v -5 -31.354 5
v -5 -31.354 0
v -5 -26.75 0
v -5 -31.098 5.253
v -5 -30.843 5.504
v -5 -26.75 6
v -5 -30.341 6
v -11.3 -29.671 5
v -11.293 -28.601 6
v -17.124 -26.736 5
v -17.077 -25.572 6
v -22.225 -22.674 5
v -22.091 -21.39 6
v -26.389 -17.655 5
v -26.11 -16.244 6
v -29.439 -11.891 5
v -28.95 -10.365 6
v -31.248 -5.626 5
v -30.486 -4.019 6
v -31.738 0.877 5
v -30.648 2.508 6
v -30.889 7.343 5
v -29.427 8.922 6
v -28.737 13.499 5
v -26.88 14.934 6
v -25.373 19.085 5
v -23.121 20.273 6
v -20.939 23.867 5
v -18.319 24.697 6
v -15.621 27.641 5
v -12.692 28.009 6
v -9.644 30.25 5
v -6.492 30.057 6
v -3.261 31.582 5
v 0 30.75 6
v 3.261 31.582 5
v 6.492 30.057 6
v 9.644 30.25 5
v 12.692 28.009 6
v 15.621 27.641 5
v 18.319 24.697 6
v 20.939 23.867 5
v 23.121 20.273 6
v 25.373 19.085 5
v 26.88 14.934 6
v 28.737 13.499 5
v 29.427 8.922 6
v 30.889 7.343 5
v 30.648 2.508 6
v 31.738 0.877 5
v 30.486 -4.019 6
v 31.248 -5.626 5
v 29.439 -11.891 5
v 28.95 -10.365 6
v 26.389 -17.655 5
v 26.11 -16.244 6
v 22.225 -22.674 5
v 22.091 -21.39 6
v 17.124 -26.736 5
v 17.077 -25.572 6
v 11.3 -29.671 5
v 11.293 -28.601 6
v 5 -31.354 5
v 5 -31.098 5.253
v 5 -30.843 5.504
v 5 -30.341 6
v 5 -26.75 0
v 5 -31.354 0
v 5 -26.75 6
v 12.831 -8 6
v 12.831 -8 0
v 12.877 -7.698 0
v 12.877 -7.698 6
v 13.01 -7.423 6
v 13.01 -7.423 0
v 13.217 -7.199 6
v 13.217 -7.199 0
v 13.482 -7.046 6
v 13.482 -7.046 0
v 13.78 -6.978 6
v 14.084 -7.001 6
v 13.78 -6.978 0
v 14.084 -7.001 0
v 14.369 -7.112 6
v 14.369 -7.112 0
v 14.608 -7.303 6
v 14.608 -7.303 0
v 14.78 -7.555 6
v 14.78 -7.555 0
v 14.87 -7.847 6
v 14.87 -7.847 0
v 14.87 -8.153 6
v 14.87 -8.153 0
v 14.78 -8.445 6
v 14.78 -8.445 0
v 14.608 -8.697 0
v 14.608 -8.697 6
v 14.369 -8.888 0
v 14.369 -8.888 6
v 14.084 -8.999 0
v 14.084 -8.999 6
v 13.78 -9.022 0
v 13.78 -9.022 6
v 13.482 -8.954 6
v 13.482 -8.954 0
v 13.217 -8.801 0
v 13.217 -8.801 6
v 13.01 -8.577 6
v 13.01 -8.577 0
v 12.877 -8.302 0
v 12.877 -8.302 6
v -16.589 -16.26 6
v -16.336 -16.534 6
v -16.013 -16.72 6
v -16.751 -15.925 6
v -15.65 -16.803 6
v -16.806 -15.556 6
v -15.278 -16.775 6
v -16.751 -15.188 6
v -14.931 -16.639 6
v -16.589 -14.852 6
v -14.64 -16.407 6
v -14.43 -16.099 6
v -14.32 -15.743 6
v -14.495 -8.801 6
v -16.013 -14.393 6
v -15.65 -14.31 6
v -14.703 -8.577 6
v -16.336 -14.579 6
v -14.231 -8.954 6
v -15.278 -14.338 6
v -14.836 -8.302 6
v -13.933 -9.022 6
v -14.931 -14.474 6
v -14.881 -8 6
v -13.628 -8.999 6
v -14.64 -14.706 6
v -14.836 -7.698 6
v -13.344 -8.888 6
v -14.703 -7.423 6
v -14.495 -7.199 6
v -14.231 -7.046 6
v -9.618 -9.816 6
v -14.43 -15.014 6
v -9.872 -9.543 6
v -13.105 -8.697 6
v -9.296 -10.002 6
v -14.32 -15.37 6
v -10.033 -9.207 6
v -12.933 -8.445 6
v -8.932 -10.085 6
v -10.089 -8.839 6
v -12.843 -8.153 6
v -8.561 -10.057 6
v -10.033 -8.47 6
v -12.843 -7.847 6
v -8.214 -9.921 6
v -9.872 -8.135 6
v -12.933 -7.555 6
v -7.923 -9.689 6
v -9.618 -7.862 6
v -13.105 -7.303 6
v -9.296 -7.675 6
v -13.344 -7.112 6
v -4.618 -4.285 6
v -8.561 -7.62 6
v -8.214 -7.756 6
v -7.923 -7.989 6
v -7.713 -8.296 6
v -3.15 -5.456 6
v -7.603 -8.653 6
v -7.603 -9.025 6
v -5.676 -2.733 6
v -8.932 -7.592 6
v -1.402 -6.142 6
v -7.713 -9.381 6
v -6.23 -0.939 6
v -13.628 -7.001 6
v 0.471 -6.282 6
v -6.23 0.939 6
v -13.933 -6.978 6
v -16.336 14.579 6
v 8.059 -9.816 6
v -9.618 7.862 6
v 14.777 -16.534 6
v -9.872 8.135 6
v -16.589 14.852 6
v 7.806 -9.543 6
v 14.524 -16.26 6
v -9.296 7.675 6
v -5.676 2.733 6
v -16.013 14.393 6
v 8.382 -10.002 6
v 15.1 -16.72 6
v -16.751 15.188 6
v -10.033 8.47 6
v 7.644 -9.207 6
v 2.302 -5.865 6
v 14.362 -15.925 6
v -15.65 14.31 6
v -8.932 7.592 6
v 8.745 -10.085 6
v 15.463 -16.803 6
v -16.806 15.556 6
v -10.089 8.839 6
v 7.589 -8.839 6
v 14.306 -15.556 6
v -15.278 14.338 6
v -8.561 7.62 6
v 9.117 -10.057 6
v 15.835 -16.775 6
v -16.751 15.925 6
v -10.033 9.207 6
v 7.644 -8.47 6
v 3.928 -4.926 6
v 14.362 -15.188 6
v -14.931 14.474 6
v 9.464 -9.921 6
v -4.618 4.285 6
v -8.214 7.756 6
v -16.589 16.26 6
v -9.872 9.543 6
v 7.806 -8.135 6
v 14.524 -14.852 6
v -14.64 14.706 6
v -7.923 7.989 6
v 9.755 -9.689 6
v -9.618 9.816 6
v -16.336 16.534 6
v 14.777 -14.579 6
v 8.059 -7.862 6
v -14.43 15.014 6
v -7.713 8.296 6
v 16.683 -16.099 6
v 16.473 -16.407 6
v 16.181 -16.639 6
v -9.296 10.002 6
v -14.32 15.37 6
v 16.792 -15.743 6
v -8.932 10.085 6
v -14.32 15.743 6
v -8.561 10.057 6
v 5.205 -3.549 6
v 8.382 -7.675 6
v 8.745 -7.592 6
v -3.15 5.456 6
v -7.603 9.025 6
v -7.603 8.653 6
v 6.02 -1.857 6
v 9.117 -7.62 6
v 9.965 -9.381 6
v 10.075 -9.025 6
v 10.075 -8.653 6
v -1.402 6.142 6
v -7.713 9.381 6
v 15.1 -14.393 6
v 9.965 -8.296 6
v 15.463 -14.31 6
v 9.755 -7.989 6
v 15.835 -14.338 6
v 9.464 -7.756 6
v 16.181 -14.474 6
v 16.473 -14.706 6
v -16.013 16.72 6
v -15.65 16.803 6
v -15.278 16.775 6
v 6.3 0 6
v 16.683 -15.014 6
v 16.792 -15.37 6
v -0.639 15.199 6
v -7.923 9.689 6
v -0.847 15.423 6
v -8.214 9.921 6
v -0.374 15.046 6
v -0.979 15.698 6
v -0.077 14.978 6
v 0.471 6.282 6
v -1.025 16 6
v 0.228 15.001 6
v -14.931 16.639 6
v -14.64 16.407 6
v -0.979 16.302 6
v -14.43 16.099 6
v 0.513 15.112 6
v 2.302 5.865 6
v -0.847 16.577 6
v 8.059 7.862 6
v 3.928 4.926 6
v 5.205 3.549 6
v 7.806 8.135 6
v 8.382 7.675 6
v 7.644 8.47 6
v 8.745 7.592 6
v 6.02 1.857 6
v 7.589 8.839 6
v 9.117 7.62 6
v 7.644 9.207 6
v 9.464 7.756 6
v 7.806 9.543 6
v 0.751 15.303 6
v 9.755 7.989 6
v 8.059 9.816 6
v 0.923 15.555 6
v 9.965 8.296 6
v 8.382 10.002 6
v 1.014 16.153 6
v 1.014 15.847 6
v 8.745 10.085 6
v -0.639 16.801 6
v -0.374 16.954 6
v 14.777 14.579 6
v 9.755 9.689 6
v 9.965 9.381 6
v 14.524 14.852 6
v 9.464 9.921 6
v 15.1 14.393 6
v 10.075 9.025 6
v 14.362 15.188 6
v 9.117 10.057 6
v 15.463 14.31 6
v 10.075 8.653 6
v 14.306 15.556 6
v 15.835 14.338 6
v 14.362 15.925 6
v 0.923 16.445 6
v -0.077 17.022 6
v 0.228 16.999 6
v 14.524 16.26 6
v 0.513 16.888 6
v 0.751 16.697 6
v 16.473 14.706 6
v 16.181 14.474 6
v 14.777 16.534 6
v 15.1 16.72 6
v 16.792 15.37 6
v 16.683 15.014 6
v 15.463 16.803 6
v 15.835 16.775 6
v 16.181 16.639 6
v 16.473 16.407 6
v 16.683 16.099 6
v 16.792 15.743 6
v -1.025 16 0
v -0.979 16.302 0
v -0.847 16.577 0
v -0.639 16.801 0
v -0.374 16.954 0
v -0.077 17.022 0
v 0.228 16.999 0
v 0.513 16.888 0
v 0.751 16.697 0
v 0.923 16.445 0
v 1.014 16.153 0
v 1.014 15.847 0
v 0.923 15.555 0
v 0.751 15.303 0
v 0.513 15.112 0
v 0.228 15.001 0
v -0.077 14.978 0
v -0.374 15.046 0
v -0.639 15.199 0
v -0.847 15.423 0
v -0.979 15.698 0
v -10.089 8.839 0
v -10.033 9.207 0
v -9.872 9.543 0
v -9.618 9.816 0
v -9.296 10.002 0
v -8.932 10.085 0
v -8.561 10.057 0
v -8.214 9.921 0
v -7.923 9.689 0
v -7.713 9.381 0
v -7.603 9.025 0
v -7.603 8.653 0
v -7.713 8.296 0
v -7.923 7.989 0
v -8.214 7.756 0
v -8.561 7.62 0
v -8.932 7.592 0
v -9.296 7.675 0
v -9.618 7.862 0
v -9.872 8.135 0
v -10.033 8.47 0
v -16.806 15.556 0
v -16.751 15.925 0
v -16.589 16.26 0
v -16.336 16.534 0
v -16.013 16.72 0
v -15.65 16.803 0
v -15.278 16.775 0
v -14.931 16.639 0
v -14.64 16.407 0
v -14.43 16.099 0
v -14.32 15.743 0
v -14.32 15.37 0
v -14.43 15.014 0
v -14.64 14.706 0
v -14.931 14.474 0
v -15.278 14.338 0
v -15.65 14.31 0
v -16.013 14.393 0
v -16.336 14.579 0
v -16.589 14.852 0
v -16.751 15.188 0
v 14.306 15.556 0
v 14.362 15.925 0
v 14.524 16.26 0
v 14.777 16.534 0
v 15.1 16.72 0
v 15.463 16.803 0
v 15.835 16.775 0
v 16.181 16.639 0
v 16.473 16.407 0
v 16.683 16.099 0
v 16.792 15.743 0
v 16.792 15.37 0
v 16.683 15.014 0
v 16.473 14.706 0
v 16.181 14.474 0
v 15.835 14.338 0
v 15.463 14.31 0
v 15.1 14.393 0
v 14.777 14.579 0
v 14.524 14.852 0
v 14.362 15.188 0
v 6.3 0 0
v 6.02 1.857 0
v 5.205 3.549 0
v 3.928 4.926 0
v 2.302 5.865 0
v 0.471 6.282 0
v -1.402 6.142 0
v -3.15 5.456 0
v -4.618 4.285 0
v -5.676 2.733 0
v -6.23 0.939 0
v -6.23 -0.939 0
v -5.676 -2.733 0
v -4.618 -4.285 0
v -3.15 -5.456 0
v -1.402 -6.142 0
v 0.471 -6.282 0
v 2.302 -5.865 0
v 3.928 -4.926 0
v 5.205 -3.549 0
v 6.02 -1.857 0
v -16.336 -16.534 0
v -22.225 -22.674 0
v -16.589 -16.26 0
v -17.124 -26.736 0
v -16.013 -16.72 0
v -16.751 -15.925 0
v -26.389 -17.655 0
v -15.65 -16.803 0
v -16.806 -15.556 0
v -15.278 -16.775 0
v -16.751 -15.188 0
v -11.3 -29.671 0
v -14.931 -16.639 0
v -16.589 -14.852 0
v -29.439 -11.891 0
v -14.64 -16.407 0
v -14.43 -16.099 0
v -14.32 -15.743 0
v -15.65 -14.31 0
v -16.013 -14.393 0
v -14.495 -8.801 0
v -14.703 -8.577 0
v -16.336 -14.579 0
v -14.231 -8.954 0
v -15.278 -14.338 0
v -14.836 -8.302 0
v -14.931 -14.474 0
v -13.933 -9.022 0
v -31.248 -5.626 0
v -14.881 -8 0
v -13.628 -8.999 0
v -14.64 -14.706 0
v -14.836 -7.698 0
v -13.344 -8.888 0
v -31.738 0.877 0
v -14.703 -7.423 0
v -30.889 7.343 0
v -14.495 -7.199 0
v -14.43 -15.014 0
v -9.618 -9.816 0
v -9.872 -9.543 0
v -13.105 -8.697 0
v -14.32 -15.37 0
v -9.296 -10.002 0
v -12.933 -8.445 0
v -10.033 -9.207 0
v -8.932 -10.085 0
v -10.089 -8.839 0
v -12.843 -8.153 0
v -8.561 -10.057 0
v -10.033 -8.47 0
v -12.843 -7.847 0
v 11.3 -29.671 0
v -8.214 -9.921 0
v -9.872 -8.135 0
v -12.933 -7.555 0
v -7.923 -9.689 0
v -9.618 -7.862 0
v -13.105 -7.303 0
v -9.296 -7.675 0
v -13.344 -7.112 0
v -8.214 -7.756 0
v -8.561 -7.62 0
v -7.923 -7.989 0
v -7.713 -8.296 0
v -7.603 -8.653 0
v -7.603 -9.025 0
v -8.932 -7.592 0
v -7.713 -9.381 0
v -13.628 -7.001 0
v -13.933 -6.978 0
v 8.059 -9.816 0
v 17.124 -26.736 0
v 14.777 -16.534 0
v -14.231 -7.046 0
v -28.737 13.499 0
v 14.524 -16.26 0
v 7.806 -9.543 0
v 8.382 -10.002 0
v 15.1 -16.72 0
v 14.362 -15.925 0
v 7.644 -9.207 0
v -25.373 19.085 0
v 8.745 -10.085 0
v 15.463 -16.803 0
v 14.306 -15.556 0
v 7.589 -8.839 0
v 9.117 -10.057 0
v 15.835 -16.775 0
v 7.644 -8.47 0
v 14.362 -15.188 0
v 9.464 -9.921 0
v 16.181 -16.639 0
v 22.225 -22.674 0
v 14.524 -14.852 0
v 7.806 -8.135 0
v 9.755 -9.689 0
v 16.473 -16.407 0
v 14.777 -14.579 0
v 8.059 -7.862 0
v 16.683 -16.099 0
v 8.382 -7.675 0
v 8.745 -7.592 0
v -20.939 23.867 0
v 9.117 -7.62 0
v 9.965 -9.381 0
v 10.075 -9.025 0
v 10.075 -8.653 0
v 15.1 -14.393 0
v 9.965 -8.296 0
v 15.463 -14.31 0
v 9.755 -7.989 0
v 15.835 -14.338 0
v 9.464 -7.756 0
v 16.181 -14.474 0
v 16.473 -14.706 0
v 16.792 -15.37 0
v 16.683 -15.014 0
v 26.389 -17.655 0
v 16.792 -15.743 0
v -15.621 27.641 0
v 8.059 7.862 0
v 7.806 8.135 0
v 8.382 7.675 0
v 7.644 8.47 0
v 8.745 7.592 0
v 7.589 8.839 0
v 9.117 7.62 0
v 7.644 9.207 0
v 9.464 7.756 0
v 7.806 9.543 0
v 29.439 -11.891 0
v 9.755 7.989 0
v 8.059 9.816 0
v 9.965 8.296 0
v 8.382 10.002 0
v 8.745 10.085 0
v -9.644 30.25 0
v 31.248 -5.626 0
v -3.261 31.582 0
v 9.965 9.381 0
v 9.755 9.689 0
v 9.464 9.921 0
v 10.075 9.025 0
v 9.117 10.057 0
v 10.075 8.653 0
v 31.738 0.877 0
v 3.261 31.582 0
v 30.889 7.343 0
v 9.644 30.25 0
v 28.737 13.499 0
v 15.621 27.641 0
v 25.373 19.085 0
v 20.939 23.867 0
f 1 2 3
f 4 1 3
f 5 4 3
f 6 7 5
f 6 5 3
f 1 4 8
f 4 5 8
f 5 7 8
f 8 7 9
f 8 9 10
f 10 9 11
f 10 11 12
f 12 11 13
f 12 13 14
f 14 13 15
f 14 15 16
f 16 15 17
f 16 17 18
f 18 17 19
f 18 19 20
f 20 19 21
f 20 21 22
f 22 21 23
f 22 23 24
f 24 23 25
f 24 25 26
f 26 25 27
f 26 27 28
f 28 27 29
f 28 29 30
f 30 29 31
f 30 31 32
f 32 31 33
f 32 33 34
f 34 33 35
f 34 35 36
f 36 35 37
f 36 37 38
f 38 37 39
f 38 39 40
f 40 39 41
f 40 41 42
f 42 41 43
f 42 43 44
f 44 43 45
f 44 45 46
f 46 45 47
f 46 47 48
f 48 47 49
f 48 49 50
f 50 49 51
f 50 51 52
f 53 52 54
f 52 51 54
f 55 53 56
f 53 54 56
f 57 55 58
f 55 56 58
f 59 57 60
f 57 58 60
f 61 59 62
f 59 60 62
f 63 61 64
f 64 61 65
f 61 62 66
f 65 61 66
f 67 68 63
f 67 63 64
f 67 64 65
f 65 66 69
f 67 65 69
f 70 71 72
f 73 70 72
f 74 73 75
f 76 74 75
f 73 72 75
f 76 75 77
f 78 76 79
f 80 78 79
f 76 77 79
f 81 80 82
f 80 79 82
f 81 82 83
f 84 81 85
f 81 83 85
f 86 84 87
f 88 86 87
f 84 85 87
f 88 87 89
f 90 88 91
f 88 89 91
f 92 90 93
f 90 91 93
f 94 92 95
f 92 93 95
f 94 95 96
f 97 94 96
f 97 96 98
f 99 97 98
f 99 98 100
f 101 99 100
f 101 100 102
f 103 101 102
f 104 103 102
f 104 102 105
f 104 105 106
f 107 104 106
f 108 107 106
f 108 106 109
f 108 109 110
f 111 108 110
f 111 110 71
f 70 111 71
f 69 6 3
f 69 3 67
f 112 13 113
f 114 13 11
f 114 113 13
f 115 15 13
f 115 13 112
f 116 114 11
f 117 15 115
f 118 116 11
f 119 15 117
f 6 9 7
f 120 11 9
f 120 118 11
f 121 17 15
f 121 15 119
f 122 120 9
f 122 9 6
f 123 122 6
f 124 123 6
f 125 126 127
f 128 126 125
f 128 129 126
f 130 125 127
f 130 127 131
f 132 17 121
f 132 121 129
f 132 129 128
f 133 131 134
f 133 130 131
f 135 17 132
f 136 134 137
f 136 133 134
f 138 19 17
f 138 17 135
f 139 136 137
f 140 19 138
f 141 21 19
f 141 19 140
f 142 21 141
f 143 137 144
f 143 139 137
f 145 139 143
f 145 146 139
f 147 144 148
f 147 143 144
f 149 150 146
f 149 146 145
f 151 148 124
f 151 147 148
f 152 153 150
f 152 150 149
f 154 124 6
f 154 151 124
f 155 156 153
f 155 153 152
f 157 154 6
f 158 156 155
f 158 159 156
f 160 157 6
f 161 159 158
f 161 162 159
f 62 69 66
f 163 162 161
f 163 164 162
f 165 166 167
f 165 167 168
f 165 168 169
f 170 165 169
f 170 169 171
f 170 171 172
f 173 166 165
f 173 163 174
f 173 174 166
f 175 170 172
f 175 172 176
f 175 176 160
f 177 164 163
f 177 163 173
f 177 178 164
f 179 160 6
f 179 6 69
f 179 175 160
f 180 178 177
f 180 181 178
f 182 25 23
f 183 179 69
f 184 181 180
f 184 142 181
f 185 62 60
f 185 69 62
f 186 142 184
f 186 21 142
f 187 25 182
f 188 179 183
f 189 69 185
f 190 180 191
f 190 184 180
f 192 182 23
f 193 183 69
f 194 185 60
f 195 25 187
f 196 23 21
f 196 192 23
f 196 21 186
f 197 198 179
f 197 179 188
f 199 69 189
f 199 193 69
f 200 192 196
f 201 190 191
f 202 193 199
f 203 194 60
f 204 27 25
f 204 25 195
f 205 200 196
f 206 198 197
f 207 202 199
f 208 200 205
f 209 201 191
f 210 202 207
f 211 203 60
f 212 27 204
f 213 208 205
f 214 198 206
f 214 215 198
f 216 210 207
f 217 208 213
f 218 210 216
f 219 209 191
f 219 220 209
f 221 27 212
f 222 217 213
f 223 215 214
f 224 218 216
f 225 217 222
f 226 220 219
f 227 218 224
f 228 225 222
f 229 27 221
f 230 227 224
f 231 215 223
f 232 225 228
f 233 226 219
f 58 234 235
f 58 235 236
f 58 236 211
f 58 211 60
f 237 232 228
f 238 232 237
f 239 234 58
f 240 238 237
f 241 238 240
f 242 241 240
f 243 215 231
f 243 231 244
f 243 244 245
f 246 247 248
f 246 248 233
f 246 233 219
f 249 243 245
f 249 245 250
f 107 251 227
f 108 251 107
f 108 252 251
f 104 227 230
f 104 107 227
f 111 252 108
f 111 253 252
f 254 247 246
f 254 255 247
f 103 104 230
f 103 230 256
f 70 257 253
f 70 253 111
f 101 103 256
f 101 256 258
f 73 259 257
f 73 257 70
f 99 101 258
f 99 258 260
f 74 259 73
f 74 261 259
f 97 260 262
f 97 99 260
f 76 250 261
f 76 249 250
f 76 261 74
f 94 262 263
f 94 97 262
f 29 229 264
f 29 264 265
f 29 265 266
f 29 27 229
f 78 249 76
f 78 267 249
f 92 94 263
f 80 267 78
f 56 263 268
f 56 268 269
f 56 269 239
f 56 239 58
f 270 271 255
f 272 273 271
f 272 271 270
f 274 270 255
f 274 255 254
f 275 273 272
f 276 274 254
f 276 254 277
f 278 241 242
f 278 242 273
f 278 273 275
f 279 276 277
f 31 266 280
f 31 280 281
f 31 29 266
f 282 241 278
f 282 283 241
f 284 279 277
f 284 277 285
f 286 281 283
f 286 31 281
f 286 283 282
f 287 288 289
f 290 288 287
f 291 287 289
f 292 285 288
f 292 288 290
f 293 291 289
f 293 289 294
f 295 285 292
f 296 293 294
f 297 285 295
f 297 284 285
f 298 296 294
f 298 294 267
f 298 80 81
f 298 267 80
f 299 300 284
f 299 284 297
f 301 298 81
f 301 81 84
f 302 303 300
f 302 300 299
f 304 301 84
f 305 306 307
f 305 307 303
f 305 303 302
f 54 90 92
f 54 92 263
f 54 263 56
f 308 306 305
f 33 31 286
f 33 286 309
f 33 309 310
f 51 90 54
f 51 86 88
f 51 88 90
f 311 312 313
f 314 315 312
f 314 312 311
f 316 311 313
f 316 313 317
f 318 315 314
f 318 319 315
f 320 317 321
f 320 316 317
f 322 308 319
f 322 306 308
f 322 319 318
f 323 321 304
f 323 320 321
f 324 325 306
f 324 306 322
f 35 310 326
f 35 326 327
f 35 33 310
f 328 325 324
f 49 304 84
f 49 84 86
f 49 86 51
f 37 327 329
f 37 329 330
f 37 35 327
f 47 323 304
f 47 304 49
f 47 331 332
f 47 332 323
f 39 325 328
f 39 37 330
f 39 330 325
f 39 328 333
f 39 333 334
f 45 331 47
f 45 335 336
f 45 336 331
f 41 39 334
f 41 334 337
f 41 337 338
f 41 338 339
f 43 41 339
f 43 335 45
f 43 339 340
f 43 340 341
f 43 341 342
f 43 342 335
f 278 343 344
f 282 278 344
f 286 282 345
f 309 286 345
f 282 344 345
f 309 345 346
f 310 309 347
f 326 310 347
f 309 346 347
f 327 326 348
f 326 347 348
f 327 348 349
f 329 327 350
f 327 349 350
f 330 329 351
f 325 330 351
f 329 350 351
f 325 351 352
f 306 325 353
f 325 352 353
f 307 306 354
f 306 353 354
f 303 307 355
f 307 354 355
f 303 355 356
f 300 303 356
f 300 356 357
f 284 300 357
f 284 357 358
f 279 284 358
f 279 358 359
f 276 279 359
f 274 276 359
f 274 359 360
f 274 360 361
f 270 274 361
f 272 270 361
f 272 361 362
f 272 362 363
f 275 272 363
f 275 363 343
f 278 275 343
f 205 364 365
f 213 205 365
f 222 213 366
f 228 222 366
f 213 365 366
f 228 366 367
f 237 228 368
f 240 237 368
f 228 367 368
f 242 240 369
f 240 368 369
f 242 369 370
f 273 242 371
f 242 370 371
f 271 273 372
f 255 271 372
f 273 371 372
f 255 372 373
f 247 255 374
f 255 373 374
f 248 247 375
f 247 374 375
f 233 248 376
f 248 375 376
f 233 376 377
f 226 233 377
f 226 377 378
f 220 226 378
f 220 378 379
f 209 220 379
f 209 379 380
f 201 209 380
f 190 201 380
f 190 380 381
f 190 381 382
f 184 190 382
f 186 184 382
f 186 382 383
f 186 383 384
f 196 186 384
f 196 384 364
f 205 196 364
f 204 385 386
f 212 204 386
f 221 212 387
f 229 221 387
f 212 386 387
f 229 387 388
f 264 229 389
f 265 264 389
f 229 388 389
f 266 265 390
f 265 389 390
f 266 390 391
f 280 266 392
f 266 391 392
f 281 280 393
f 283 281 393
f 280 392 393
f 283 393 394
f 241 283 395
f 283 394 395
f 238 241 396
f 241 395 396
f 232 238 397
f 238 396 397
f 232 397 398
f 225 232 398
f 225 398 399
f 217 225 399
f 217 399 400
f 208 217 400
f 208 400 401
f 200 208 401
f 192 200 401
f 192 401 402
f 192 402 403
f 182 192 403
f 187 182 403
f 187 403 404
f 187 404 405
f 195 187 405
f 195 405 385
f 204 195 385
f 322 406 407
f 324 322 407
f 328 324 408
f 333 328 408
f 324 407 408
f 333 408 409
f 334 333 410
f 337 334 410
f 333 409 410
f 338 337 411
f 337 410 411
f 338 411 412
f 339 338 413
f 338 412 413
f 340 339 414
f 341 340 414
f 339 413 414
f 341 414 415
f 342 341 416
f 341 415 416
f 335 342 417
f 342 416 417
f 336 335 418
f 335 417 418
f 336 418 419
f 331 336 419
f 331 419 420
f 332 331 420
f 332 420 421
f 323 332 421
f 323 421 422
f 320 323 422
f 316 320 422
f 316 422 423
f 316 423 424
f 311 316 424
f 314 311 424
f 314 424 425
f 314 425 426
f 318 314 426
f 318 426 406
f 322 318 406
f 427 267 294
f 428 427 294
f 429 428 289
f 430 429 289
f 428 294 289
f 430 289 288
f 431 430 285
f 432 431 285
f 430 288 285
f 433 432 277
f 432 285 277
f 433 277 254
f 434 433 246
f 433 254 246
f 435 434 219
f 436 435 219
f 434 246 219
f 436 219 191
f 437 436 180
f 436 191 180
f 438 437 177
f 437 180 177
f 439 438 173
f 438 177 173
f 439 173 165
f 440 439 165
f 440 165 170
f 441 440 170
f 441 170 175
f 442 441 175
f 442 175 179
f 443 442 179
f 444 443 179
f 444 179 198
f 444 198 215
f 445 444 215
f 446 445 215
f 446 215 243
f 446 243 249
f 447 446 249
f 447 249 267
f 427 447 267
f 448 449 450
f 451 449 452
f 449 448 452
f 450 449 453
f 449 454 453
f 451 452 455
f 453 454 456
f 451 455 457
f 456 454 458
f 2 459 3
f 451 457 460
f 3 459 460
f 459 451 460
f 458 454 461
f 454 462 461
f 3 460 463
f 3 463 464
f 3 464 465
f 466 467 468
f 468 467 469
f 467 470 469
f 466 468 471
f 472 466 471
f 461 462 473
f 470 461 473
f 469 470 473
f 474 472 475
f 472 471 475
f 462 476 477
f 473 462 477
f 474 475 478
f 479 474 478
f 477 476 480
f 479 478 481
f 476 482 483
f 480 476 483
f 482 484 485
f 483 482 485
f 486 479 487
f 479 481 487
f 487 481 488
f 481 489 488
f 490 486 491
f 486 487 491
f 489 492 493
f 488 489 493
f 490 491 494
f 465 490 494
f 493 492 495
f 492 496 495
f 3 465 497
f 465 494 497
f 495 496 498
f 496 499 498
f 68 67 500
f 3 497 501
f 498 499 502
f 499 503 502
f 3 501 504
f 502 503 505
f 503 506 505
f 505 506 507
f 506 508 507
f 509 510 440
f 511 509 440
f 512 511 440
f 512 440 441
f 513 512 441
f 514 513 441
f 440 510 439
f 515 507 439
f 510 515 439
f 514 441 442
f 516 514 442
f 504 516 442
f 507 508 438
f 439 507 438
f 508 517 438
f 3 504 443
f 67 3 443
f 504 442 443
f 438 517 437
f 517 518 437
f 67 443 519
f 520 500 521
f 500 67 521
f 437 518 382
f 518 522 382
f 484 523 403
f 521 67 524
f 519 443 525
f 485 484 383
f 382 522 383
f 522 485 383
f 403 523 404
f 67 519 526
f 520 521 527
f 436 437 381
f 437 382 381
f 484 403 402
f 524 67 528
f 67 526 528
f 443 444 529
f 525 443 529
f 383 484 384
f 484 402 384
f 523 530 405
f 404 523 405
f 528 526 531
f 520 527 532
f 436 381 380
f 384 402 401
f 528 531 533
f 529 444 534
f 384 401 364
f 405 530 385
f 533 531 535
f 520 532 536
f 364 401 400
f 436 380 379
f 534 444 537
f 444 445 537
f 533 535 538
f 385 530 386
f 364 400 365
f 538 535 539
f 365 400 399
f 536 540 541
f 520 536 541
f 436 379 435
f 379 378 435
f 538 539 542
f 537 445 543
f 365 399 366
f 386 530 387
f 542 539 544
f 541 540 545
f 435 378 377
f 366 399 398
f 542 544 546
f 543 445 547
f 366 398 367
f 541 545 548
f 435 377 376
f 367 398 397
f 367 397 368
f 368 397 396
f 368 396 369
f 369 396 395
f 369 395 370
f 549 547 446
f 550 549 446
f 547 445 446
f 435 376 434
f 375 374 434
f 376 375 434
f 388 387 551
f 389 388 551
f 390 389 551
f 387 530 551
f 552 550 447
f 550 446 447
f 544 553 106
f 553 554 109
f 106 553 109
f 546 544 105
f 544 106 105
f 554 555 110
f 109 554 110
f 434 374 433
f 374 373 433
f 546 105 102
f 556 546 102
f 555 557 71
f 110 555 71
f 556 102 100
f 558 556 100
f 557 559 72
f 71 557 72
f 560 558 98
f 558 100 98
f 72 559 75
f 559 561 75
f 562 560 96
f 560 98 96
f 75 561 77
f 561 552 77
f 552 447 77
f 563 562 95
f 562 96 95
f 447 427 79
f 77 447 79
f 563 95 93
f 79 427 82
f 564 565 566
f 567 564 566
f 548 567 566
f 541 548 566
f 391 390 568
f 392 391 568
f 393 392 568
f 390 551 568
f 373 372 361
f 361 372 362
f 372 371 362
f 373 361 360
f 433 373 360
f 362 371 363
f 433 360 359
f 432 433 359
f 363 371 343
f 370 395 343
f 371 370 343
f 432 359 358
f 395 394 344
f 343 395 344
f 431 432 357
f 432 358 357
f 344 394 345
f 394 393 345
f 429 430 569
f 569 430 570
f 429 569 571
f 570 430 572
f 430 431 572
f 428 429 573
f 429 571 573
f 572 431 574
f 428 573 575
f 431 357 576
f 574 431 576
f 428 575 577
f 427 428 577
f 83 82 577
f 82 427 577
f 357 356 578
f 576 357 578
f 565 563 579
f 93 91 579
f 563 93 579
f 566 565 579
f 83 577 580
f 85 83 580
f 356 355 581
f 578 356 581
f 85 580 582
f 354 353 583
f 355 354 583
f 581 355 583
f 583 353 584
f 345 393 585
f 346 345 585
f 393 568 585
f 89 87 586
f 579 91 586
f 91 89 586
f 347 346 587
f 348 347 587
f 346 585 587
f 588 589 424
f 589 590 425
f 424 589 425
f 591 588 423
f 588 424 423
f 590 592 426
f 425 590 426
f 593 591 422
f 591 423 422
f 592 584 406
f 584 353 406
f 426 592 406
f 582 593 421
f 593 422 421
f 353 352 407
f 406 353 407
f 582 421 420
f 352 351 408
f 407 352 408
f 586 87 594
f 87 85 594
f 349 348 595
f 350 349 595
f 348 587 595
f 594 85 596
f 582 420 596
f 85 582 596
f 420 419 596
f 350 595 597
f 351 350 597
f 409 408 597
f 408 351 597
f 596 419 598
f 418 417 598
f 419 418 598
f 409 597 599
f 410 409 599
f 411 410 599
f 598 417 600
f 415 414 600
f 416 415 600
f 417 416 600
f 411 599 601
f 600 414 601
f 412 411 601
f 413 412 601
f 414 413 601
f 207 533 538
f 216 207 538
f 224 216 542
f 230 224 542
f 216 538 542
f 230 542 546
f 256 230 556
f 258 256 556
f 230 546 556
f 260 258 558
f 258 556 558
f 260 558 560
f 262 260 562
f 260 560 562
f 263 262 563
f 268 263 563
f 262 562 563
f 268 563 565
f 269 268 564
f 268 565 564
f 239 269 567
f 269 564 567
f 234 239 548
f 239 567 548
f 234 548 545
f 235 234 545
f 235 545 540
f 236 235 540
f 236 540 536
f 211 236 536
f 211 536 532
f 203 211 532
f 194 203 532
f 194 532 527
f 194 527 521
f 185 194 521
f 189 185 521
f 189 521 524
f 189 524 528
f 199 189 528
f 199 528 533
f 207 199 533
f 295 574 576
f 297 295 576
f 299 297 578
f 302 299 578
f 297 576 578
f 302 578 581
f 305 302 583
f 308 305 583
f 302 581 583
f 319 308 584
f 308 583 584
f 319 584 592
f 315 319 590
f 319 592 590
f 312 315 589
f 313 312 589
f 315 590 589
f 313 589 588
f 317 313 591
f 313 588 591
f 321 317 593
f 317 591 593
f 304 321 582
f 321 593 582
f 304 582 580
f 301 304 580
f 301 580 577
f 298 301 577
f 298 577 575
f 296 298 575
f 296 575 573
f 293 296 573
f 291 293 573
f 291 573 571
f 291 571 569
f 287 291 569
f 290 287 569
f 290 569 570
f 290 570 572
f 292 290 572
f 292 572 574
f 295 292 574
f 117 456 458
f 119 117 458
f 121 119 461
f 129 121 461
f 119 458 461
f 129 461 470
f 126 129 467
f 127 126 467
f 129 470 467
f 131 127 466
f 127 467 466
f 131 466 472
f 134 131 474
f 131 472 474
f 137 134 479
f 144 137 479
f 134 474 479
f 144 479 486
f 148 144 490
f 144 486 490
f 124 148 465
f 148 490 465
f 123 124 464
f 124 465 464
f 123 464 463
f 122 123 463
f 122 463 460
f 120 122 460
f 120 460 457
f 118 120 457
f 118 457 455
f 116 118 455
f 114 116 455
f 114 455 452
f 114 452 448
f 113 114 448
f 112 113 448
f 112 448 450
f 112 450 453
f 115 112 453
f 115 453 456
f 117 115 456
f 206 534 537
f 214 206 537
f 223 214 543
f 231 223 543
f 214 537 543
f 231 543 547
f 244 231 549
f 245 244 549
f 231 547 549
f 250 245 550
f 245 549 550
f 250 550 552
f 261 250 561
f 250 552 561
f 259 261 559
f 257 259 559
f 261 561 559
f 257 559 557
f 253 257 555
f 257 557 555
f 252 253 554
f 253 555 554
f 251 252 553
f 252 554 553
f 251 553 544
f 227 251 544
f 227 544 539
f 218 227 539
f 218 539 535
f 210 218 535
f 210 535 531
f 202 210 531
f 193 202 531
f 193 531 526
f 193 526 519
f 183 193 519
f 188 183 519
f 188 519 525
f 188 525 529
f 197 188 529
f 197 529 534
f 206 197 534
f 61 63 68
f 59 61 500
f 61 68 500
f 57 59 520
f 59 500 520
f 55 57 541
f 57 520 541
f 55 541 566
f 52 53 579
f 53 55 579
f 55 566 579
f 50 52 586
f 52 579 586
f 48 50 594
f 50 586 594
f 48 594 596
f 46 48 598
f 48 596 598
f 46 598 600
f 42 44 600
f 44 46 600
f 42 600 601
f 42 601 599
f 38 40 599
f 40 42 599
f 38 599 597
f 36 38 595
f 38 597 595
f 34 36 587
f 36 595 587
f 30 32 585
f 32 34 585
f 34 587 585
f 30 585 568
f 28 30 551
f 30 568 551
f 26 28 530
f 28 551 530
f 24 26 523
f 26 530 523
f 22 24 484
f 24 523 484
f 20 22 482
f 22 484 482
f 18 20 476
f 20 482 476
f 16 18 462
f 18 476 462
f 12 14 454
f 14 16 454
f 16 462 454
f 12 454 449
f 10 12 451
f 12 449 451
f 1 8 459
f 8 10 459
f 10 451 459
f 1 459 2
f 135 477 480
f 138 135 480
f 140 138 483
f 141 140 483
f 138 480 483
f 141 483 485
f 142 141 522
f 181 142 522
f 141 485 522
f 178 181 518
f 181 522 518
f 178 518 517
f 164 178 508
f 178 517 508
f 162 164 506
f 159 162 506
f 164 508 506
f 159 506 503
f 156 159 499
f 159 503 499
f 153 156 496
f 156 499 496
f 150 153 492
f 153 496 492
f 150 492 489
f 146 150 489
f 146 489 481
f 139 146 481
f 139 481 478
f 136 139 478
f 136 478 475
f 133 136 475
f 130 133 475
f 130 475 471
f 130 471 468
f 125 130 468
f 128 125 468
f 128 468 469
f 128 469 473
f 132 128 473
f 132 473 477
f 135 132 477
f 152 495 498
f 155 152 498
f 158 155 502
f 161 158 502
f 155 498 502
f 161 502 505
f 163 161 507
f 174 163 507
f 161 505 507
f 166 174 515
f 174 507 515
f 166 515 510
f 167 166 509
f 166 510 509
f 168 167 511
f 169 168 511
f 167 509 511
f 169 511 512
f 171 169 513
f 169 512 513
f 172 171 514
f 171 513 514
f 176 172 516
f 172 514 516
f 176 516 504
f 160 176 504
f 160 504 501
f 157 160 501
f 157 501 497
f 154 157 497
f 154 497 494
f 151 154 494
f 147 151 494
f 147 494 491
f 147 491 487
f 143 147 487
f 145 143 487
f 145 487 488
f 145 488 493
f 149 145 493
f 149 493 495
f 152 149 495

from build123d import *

# Parameters (mm, degrees)
SKETCH_1_R          = 31.75
EXTRUDE_1_DEPTH     = 6
SKETCH_2_W          = 10
SKETCH_2_H          = 10
CUT_EXTRUDE_1_DEPTH = 7
M2_5X0_451_D        = 2.05
M3X0_51_D           = 2.5
SKETCH_8_R          = 6.3
CUT_EXTRUDE_2_DEPTH = 7
CHAMFER_1_SIZE      = 1


with BuildPart() as part:
    # Эскиз1 → Бобышка-Вытянуть1 (new body)
    with BuildSketch(Plane.XY):
        Circle(SKETCH_1_R)
    extrude(amount=EXTRUDE_1_DEPTH)

    # Эскиз2 → Вырез-Вытянуть1 (cut, through all)
    with BuildSketch(Plane.XY.offset(6)):
        with Locations((0, -31.75)):
            Rectangle(SKETCH_2_W, SKETCH_2_H)
    extrude(amount=-CUT_EXTRUDE_1_DEPTH, mode=Mode.SUBTRACT)

    # Отверстие обработанное метчиком M2.5x0.451 (through all)
    with Locations(Plane.XY.offset(6)):
        with Locations((0, 16), (13.856406461, -8), (-13.856406461, -8)):
            Hole(M2_5X0_451_D / 2)

    # Отверстие обработанное метчиком M3x0.51 (through all)
    with Locations(Plane.XY.offset(6)):
        with Locations((-15.556349186, 15.556349186), (-15.556349186, -15.556349186), (15.556349186, -15.556349186), (15.556349186, 15.556349186), (8.838834765, 8.838834765), (-8.838834765, 8.838834765), (-8.838834765, -8.838834765), (8.838834765, -8.838834765)):
            Hole(M3X0_51_D / 2)

    # Эскиз8 → Вырез-Вытянуть2 (cut, through all)
    with BuildSketch(Plane.XY.offset(6)):
        Circle(SKETCH_8_R)
    extrude(amount=-CUT_EXTRUDE_2_DEPTH, mode=Mode.SUBTRACT)

    # Фаска1
    chamfer_1_edges = [part.edges().sort_by_distance(p)[0] for p in [
        (0, 31.75, 6),
    ]]
    chamfer(chamfer_1_edges, length=CHAMFER_1_SIZE)


solid = part.part
